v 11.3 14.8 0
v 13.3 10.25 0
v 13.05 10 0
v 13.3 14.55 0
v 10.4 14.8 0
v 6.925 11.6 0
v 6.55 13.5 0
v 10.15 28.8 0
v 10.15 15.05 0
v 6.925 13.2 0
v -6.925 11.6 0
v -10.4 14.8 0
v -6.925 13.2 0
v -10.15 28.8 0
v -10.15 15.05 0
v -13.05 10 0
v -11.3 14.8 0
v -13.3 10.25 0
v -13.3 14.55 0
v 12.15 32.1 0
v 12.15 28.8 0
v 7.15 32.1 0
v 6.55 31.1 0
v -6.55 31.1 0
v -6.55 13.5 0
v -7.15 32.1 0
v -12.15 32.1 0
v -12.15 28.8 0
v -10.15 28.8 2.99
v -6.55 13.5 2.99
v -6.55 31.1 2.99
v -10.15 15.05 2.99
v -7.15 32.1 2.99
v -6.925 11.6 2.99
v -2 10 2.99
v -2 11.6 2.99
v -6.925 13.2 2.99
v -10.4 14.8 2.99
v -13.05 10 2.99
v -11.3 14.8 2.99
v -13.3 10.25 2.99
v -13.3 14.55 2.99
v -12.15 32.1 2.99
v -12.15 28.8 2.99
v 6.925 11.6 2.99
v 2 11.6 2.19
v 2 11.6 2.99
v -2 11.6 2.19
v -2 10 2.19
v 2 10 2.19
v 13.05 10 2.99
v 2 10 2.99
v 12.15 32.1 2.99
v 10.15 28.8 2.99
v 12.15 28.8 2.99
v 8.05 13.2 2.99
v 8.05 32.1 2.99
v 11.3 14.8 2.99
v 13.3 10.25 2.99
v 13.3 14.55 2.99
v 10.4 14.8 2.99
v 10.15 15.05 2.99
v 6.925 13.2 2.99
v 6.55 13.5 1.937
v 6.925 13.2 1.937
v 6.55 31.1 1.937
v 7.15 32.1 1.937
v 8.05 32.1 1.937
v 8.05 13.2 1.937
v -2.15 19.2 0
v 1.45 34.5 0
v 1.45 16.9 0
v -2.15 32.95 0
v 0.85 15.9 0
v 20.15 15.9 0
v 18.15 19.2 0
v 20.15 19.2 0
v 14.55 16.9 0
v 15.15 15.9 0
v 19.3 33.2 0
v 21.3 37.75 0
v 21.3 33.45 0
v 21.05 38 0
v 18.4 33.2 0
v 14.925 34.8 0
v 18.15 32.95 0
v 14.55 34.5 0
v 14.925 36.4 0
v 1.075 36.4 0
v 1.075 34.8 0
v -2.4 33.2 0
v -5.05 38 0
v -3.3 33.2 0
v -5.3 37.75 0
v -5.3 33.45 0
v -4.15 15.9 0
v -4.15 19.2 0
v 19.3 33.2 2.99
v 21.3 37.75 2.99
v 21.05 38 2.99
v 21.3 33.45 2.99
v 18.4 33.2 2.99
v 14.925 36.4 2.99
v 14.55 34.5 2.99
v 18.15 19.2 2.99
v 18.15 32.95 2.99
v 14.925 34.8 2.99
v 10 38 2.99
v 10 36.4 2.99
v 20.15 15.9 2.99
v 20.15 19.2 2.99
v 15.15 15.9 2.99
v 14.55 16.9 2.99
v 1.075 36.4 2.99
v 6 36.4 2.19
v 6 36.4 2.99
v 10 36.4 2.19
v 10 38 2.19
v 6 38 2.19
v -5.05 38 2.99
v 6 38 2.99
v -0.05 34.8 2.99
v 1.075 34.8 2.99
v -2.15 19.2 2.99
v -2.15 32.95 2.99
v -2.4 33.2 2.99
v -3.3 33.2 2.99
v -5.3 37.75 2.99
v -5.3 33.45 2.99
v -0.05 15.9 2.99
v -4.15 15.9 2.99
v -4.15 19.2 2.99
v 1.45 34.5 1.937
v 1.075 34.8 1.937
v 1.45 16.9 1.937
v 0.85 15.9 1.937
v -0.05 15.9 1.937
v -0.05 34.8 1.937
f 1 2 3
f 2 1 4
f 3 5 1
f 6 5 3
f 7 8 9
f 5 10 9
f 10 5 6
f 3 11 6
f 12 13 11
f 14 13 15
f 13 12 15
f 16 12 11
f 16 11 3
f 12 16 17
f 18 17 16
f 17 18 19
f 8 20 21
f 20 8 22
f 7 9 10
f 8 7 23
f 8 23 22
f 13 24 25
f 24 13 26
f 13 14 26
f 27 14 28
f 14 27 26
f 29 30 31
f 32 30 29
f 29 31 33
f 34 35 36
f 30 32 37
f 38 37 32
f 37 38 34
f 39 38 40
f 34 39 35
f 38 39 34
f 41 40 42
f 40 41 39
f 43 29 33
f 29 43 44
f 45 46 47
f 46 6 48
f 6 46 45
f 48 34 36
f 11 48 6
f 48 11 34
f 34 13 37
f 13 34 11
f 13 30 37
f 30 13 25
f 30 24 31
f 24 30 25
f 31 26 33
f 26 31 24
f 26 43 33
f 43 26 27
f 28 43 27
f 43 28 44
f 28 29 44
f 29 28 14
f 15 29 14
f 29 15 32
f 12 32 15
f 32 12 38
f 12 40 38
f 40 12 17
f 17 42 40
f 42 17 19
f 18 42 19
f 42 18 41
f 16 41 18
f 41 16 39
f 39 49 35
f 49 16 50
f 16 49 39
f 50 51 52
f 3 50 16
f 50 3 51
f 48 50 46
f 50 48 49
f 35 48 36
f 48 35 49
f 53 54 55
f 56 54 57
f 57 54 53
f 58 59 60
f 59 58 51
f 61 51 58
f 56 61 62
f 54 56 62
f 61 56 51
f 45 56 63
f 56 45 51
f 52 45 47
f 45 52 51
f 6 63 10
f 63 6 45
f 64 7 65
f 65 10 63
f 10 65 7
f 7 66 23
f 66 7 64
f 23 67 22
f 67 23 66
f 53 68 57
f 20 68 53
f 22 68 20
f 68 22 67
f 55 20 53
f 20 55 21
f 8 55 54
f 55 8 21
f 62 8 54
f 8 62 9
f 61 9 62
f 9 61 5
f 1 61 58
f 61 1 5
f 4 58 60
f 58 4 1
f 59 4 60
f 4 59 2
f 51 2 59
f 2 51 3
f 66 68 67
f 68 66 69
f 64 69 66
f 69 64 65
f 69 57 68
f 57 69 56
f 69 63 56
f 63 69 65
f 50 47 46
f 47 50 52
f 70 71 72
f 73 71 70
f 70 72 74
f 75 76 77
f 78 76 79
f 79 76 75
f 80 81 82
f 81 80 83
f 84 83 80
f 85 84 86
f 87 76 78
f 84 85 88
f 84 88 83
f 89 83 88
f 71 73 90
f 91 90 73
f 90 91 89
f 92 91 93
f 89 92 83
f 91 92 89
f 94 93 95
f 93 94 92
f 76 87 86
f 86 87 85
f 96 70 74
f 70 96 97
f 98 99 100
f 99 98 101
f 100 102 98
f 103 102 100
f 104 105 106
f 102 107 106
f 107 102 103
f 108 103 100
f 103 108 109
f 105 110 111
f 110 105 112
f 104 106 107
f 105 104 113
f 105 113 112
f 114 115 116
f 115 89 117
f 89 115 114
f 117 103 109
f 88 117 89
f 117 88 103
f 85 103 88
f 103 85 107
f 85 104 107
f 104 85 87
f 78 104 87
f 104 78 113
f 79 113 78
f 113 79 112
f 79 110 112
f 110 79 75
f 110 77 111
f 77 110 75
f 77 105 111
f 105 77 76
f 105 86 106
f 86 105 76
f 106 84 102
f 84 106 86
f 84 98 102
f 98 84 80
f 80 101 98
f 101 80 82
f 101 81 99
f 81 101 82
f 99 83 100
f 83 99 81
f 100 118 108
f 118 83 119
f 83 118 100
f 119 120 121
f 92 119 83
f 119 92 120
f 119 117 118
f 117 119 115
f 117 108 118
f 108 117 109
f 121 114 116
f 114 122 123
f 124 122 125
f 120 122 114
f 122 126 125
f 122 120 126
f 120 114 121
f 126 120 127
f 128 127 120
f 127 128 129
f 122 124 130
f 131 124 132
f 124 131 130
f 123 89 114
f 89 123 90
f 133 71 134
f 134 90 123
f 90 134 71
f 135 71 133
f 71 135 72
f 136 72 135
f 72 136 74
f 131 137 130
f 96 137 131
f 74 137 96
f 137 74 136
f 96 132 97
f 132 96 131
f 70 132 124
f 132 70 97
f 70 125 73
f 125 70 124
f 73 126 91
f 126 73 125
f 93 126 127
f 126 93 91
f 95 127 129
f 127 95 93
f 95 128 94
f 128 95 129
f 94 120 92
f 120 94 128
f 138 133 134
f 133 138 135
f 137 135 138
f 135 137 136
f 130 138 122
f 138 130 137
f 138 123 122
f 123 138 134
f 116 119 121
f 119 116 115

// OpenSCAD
// ITC Holder -*- C -*-
// Copyright (C) 2018-2019 The T2 Tile Project
// Licensed under GPL-3


function in2MM ( vec) = 25.4 * vec;
function max3 ( v ) = max(v[0],v[1],v[2]);

// Base measurements
boardWidthMM = 17.95;
boardLengthMM = 25.6;
boardSlotXStartMM = 7.4;
boardSlotXEndMM = 10.59;
boardSlot1YStartMM = 0.0;
boardSlot1YEndMM = 6.0;
boardSlot2YStartMM = 19.85;
boardHeightMM = 1.6;
boardBoxClearanceMM = 1.6;  // height from top of board to bottom of engaged box header
boardSolderClearanceMM = 1.5;  // height from bottom of board to top of solder posts
headerWidthMM = in2MM(.2);  // excluding key
headerLengthMM = in2MM(.8);
boxWidthMM = in2MM(.3);    // XXX placeholder
boxLengthMM = in2MM(1.2);  // XXX placeholder
boxGapMM = in2MM(.09);      // XXX placeholder
loopHeightMM = 22.10;
keyWidthMM = 4.0;
interiorPillarWidthMM = 6.5;
grabTabHeightMM = 15.;
grabBridgeHeightMM = -1;
capsuleRadiusMM=5;
capsuleHalfLenMM = 9.7;

keyInDepthFrac = 0.33;
keyInWidthMM = 1.5;


// Derived measurements
boardSlot2YEndMM = boardHeightMM;

keyInDepthMM = keyInDepthFrac * (boardSlotXEndMM - boardSlotXStartMM);

arcRad = 1.5;

// arc module based on code by chickenchuck040, licensed under CC-BY,
// found at http://www.thingiverse.com/thing:1092611
module arc(radius, thick, angle,start_angle){
  rotate([0,0,start_angle])
    intersection(){
    union(){
      rights = floor(angle/90);
      remain = angle-rights*90;
      if(angle > 90){
        for(i = [0:rights-1]){
          rotate(i*90-(rights-1)*90/2){
            polygon([[0, 0], 
                     [radius+thick, (radius+thick)*tan(90/2)], 
                     [radius+thick, -(radius+thick)*tan(90/2)]]);
          }
        }
        rotate(-(rights)*90/2)
          polygon([[0, 0], 
                   [radius+thick, 0], 
                   [radius+thick, -(radius+thick)*tan(remain/2)]]);
        rotate((rights)*90/2)
          polygon([[0, 0], 
                   [radius+thick, (radius+thick)*tan(remain/2)], 
                   [radius+thick, 0]]);
      }else{
        polygon([[0, 0], 
                 [radius+thick, (radius+thick)*tan(angle/2)], 
                 [radius+thick, -(radius+thick)*tan(angle/2)]]);
      }
    }
    difference(){
      circle(radius+thick);
      circle(radius);
    }
  }
}

module throughslot() {
  slotWidth = boardSlotXEndMM - boardSlotXStartMM;
  cube([slotWidth,1,boardHeightMM]);
}

// Build one full end of an itc tab
module tabend() {
  throughslot();
}


// Half the loop running through the slots and under the board
// Polygon points:
//
//        h....i1
//        .      . 
//        .       i2
//       g2...g1  .
//            .   .
//            .   .
//            .   .
//            .   .
//            .   .
//            .   .
//            g   .
//           .    .
//     e....f     .
//    .           .
//   d            .
//   .            j
//   .           .
//   .          k
//   .          .
//   .          l...........m
//   c                      .
//    .                     .
//     b....................a
//

function itchLoopPts() =
  let (slotWidth = boardSlot2YStartMM-boardSlot1YEndMM,
       halfSlotWidth = slotWidth/2)
  let (BdX = -boardLengthMM/2-0.25,
       CdX = -.25,
       CdY = 0.25,
       DdY = 4.3,
       EdX = 2, 
       EdY = 0.25,
       FdX = 0.9,
       GdX = 0.25,
       GdY = 0.25,
       G1dY = -3.3, // down from loop height
       G2dX = 2.0,   
       I1dX = 5.0, // XXX dependent on slot width
       I2dX = 0.6, // XXX dependent on slot width
       I2dY = -1., 
       JdY = -loopHeightMM-I2dY+3.5,
       KdY = -0.25)
    let (a = [0,0],
         b = [a[0]+BdX, a[1]],
         c = [b[0]+CdX, b[1]+CdY],
         d = [c[0], c[1]+DdY],
         e = [d[0]+EdX, d[1]+EdY],
         f = [e[0]+FdX, e[1]],
         g = [f[0]+GdX, f[1]+GdY],
         g1 = [g[0], loopHeightMM+G1dY],
         g2 = [g1[0]-G2dX, g1[1]],
         h = [g2[0], loopHeightMM],
         i1 = [h[0]+I1dX, h[1]],
         i2 = [i1[0]+I2dX, h[1]+I2dY],
         j = [i2[0], i2[1]+JdY],
         k = [-halfSlotWidth, boardBoxClearanceMM+boardHeightMM],
         l = [k[0], boardBoxClearanceMM],
         m = [a[0], l[1]])
//[0][1][2][3][4][5][6] [7] [8][9][10][11][12][13][14][15]
  [a, b, c, d, e, f, g, g1, g2, h, i1, i2,  j,  k,  l,  m];

module keyInSlot(length) {
  cube([keyInWidthMM+.01,length,keyInDepthMM]);
}

module itchLoop(keyin) {
  slotWidthInternal = boardSlotXEndMM - boardSlotXStartMM - 0.2;
  pts = itchLoopPts();
  difference() {
    linear_extrude(height = slotWidthInternal)
      polygon(pts);
    if (keyin) {
      translate([pts[12][0]-keyInWidthMM,pts[13][1],slotWidthInternal-keyInDepthMM]) {
        keyInSlot(pts[10][1]-pts[13][1]);
      }
    }
    translate([0,0,0]) {
      halfKeyWidthMM = keyWidthMM/2;
      keyHeightMM = 0.8;
      translate([-halfKeyWidthMM,0,slotWidthInternal-keyHeightMM]) {
        cube([halfKeyWidthMM,pts[15][1],3]);
      }
    }
  }
}

module itch10()
{
  scale([1,1,1]) itchLoop(false);
  scale([-1,1,1]) itchLoop(true);

}
module thumb10() {
  slotWidth = boardSlotXEndMM - boardSlotXStartMM;
  tabWidth = 7.4;
  flangeWidth = 1.85*tabWidth;
  radius = tabWidth/2;
  union() {
    difference() {
      union() {

        // Grab tab
        linear_extrude(height=grabTabHeightMM) {
          difference() {
            union() {
              square([boardLengthMM,tabWidth],center=true);
              // Symmetry-breaking key-out extension
              translate([0,.6,0]) {
                square([keyWidthMM,tabWidth],center=true);
              }
            }
          }
        }

        // Top rounding
        capsule();

        // Base flange
        flangeThickness=7.8;
        difference() {
          linear_extrude(height=flangeThickness) {
            translate([0,0,0]) {
              square([boardLengthMM,.93*boardWidthMM],center=true);
            }
          }
          // Drop arcs on sides for finger clearance
          translate([0.0,10,9]) rotate([90,0,0]) {
            scale([1.8,1.4,1])
            linear_extrude(height=20) 
            arc(.1,4.5,180,-90);
          }
          // And ease the finger arc edges 
          for (i = [-1,1]) {
            translate([i*9.185,10,6.3]) rotate([90,0,0]) {
              scale([i*1.,1.,1])
              linear_extrude(height=20) 
              arc(arcRad,2*arcRad,63,123);
            }
          }

          // ease flange vertical edges
          distanceOut = 6.85;
          for (i = [1,-1]) {
            translate([i*11.3,distanceOut,-1]) rotate([0,0,0]) 
              linear_extrude(height=flangeThickness+2) 
                arc(arcRad,3,90,1*(45+(1-i)/2*90));
            translate([i*11.3,-distanceOut,-1]) rotate([0,0,0]) 
              linear_extrude(height=flangeThickness+2) 
                arc(arcRad,3,90,-1*(45+(1-i)/2*90));
          }
        }
      }
      rotate([90,0,0])
        tabNotch(tabWidth/2);
    }
    linear_extrude(height=grabTabHeightMM-grabBridgeHeightMM) {
      translate([0,0,0]) {
        square([interiorPillarWidthMM,7],center=true);
      }
    }
    fudgeEase = 0.2;
    translate([interiorPillarWidthMM/2-fudgeEase,keyInDepthMM-radius/2-fudgeEase,0]) {
      rotate([90,0,0]) {
        keyInSlot(grabTabHeightMM-grabBridgeHeightMM-6);
      }
    }
  }
}

module capsuleCap() {
  capRadius = .92*capsuleRadiusMM;
  capHalfLen = 1.01*capsuleHalfLenMM;
  difference() {
    union() {
      linear_extrude(height=3.35) {
        translate([capHalfLen,0]) {
          circle(r=capRadius);
        }
        translate([-capHalfLen,-capRadius]) {
          rotate([0,0]) {
            square([2*capHalfLen,2*capRadius]);
          }
        }
        translate([-capHalfLen,0]) {
          circle(r=capRadius);
        }
      }
    }
    pillarGap = 1.10*interiorPillarWidthMM;
    pillarGapDrop = -2;
    translate([-pillarGap/2,-capRadius-pillarGapDrop,-1]) {
      cube([pillarGap,12,10]);
    }
    for (i = [-1,1]) {
      scale([i,1,1])
      translate([5,-2,-1]) {
        cube([7,10,10]);
        translate([4,3,0]) {
          cube([7,10,10]);
        }
        // Slightly angle the cap wedges to ease insertion
        translate([1.2,3,0]) {
          rotate([0,0,30])
            cube([5,5,6]);
        }
      }
    }
  }
}

module capsule() {
  height = grabTabHeightMM;
  translate([capsuleHalfLenMM,0,height]) {
    sphere(r=capsuleRadiusMM);
  }
  translate([-capsuleHalfLenMM,0,height]) {
    rotate([0,90,0]) {
      cylinder(h=2*capsuleHalfLenMM,r=capsuleRadiusMM);
    }
  }
  translate([-capsuleHalfLenMM,0,height]) {
    sphere(r=capsuleRadiusMM);
  }
}

module tabNotch(zoffset) {
  cubeX = 20.6;
  cubeY = loopHeightMM;
  cubeZ = zoffset;
  fudgeY = 1;
  tabLatchShelfOffset = 14.2;
#  translate([-cubeX/2,-fudgeY,-zoffset/2]) {
    cube([cubeX,cubeY+fudgeY,cubeZ]);
    translate([-cubeX/2,tabLatchShelfOffset,0]) {
      cube([2*cubeX,10,cubeZ]);
    }
  }
}

$fn=50;
translate([0,10,0]) {
  itch10();
}

translate([8,38,0]) {
  rotate([0,0,180])
    itch10();
}

*thumb10();

*translate([0,28,0]) {
  rotate([0,0,90]) {
    capsuleCap(); 
  }
}
